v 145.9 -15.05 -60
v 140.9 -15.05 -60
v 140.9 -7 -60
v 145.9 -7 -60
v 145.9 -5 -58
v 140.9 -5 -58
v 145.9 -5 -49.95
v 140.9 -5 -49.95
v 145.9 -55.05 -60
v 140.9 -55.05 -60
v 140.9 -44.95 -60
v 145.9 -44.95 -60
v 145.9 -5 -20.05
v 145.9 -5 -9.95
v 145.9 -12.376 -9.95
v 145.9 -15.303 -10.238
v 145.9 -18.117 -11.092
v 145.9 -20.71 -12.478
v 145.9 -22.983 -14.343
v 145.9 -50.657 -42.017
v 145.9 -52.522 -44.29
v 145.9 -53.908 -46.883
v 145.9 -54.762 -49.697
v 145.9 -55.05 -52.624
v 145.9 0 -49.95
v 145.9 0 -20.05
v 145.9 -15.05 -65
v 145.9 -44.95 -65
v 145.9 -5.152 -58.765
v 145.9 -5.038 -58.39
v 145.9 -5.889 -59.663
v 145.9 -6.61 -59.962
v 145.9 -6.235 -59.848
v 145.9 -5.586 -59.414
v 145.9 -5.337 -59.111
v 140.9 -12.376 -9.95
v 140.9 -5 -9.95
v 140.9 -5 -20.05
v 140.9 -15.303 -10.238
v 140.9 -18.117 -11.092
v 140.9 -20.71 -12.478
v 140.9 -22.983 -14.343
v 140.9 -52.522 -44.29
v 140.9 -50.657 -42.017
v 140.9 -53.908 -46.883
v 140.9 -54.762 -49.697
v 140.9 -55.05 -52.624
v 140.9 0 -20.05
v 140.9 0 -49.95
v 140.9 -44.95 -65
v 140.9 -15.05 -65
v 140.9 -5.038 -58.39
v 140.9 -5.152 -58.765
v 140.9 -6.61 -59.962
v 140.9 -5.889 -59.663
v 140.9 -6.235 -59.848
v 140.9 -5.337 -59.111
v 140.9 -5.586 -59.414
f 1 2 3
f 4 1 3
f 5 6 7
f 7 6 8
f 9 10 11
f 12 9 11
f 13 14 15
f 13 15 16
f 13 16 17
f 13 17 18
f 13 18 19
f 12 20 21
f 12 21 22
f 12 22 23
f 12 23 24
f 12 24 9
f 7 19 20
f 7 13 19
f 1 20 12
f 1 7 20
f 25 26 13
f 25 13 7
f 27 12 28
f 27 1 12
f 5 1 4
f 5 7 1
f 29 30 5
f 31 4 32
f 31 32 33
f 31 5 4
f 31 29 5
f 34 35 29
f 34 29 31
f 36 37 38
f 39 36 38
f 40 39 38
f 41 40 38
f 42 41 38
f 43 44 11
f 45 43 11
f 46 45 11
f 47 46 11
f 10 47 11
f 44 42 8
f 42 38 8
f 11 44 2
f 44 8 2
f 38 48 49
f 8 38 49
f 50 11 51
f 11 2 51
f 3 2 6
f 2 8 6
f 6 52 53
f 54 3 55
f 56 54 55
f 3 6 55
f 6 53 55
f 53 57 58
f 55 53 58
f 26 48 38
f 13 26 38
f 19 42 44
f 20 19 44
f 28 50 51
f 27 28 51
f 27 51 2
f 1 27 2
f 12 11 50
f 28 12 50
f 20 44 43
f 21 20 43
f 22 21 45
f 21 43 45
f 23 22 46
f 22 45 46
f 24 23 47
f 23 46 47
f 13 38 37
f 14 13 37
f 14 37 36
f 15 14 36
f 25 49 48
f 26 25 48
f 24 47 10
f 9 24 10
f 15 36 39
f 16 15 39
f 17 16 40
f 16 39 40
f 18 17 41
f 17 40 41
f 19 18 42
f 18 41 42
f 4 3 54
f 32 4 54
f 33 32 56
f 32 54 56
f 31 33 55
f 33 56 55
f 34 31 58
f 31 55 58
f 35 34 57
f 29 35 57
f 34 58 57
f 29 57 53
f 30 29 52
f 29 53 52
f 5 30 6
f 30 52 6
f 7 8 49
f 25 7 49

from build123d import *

# Parameters (mm, degrees)
BODY_MOVE_COPY1_START         = -65
BODY_MOVE_COPY1_OUTLINE_W     = 5.1
BODY_MOVE_COPY1_OUTLINE_H     = 30.1
BODY_MOVE_COPY1_OUTLINE_R     = 2.6
BODY_MOVE_COPY1_OUTLINE_R_2   = 3.1
BODY_MOVE_COPY1_OUTLINE_R_3   = 1.55
BODY_MOVE_COPY1_OUTLINE_W_2   = 30.5
BODY_MOVE_COPY1_OUTLINE_H_2   = 14.5
BODY_MOVE_COPY1_DEPTH         = 5
BODY_MOVE_COPY1_START_2       = -5
BODY_MOVE_COPY1_2_OUTLINE_W   = 10
BODY_MOVE_COPY1_2_OUTLINE_H   = 5.2
BODY_MOVE_COPY1_2_OUTLINE_R   = 1.6
BODY_MOVE_COPY1_2_OUTLINE_W_2 = 5.1
BODY_MOVE_COPY1_2_OUTLINE_H_2 = 30.1
BODY_MOVE_COPY1_2_DEPTH       = 5
BOSS_EXTRUDE2_DEPTH           = 5


# Read off the part's stored shape, not the designer's step: Body-Move/Copy1
with BuildPart() as part:
    # Body-Move/Copy1 outline → Body-Move/Copy1 (new body)
    with BuildSketch(Plane.XY.offset(BODY_MOVE_COPY1_START)):
        Polygon((24.9, -310), (24.9, -305), (100.2, -305), (100.2, -310), (150, -310), (150, -5), (10.65, -5), (10.65, 0), (-10.65, 0), (-10.65, -5), (-150, -5), (-150, -310), (-100.2, -310), (-100.2, -305), (-24.9, -305), (-24.9, -310), align=None)
        with Locations((-143.45, -280)):
            Rectangle(BODY_MOVE_COPY1_OUTLINE_W, BODY_MOVE_COPY1_OUTLINE_H, mode=Mode.SUBTRACT)
        with Locations((-90, -157.5)):
            Circle(BODY_MOVE_COPY1_OUTLINE_R, mode=Mode.SUBTRACT)
        with Locations((-60, -157.5)):
            Circle(BODY_MOVE_COPY1_OUTLINE_R, mode=Mode.SUBTRACT)
        with Locations((143.45, -280)):
            Rectangle(BODY_MOVE_COPY1_OUTLINE_W, BODY_MOVE_COPY1_OUTLINE_H, mode=Mode.SUBTRACT)
        with Locations((65, -157.5)):
            Circle(BODY_MOVE_COPY1_OUTLINE_R_2, mode=Mode.SUBTRACT)
        with Locations((85, -157.5)):
            Circle(BODY_MOVE_COPY1_OUTLINE_R_2, mode=Mode.SUBTRACT)
        with Locations((-90, -137.5)):
            Circle(BODY_MOVE_COPY1_OUTLINE_R_3, mode=Mode.SUBTRACT)
        with Locations((-60, -137.5)):
            Circle(BODY_MOVE_COPY1_OUTLINE_R_3, mode=Mode.SUBTRACT)
        with Locations((-75, -100.25)):
            Rectangle(BODY_MOVE_COPY1_OUTLINE_W_2, BODY_MOVE_COPY1_OUTLINE_H_2, mode=Mode.SUBTRACT)
        with Locations((-143.45, -30)):
            Rectangle(BODY_MOVE_COPY1_OUTLINE_W, BODY_MOVE_COPY1_OUTLINE_H, mode=Mode.SUBTRACT)
        with Locations((143.45, -30)):
            Rectangle(BODY_MOVE_COPY1_OUTLINE_W, BODY_MOVE_COPY1_OUTLINE_H, mode=Mode.SUBTRACT)
    extrude(amount=BODY_MOVE_COPY1_DEPTH)


with BuildPart() as body_2:
    # Body-Move_Copy1 2 outline → Body-Move_Copy1 2 (new body)
    with BuildSketch(Plane(origin=(0, 0, 0), x_dir=(1, 0, 0), z_dir=(0, 1, 0)).offset(BODY_MOVE_COPY1_START_2)):
        with BuildLine():
            ThreePointArc((-95, -65), (-93.535533906, -61.464466094), (-90, -60))
            Line((-90, -60), (90, -60))
            ThreePointArc((90, -60), (93.535533906, -61.464466094), (95, -65))
            Line((95, -65), (95, -70))
            ThreePointArc((95, -70), (96.464466094, -73.535533906), (100, -75))
            Line((100, -75), (115, -75))
            ThreePointArc((115, -75), (118.535533906, -73.535533906), (120, -70))
            Line((120, -70), (120, -60))
            Line((120, -60), (145.606601718, -34.393398282))
            ThreePointArc((145.606601718, -34.393398282), (148.858192988, -29.52704805), (150, -23.786796564))
            Line((150, -23.786796564), (150, 65))
            Line((150, 65), (10.75, 65))
            Line((10.75, 65), (10.75, 60))
            Line((10.75, 60), (-10.75, 60))
            Line((-10.75, 60), (-10.75, 65))
            Line((-10.75, 65), (-150, 65))
            Line((-150, 65), (-150, -23.786796564))
            ThreePointArc((-150, -23.786796564), (-148.858192988, -29.52704805), (-145.606601718, -34.393398282))
            Line((-145.606601718, -34.393398282), (-120, -60))
            Line((-120, -60), (-120, -70))
            ThreePointArc((-120, -70), (-118.535533906, -73.535533906), (-115, -75))
            Line((-115, -75), (-100, -75))
            ThreePointArc((-100, -75), (-96.464466094, -73.535533906), (-95, -70))
            Line((-95, -70), (-95, -65))
        make_face()
        with Locations((-107.5, -67.5)):
            Rectangle(BODY_MOVE_COPY1_2_OUTLINE_W, BODY_MOVE_COPY1_2_OUTLINE_H, mode=Mode.SUBTRACT)
        with Locations((-110, -52.5)):
            Circle(BODY_MOVE_COPY1_2_OUTLINE_R, mode=Mode.SUBTRACT)
        with Locations((-5, -52.5)):
            Circle(BODY_MOVE_COPY1_2_OUTLINE_R, mode=Mode.SUBTRACT)
        with Locations((5, -52.5)):
            Circle(BODY_MOVE_COPY1_2_OUTLINE_R, mode=Mode.SUBTRACT)
        with Locations((107.5, -67.5)):
            Rectangle(BODY_MOVE_COPY1_2_OUTLINE_W, BODY_MOVE_COPY1_2_OUTLINE_H, mode=Mode.SUBTRACT)
        with Locations((110, -52.5)):
            Circle(BODY_MOVE_COPY1_2_OUTLINE_R, mode=Mode.SUBTRACT)
        with Locations((-143.45, 35)):
            Rectangle(BODY_MOVE_COPY1_2_OUTLINE_W_2, BODY_MOVE_COPY1_2_OUTLINE_H_2, mode=Mode.SUBTRACT)
        with Locations((-110, 52.5)):
            Circle(BODY_MOVE_COPY1_2_OUTLINE_R, mode=Mode.SUBTRACT)
        with Locations((-5, 52.5)):
            Circle(BODY_MOVE_COPY1_2_OUTLINE_R, mode=Mode.SUBTRACT)
        with BuildLine():
            Line((131.606601718, -30.178932188), (115.267766953, -46.517766953))
            ThreePointArc((115.267766953, -46.517766953), (114.456708581, -47.059698831), (113.5, -47.25))
            Line((113.5, -47.25), (107.75, -47.25))
            ThreePointArc((107.75, -47.25), (105.982233047, -47.982233047), (105.25, -49.75))
            Line((105.25, -49.75), (105.25, -53.5))
            ThreePointArc((105.25, -53.5), (104.517766953, -55.267766953), (102.75, -56))
            Line((102.75, -56), (13.25, -56))
            ThreePointArc((13.25, -56), (11.482233047, -55.267766953), (10.75, -53.5))
            Line((10.75, -53.5), (10.75, -49.75))
            ThreePointArc((10.75, -49.75), (10.017766953, -47.982233047), (8.25, -47.25))
            Line((8.25, -47.25), (-8.25, -47.25))
            ThreePointArc((-8.25, -47.25), (-10.017766953, -47.982233047), (-10.75, -49.75))
            Line((-10.75, -49.75), (-10.75, -53.5))
            ThreePointArc((-10.75, -53.5), (-11.482233047, -55.267766953), (-13.25, -56))
            Line((-13.25, -56), (-102.75, -56))
            ThreePointArc((-102.75, -56), (-104.517766953, -55.267766953), (-105.25, -53.5))
            Line((-105.25, -53.5), (-105.25, -49.75))
            ThreePointArc((-105.25, -49.75), (-105.982233047, -47.982233047), (-107.75, -47.25))
            Line((-107.75, -47.25), (-113.5, -47.25))
            ThreePointArc((-113.5, -47.25), (-115.267766953, -46.517766953), (-116, -44.75))
            Line((-116, -44.75), (-116, 44.75))
            ThreePointArc((-116, 44.75), (-115.267766953, 46.517766953), (-113.5, 47.25))
            Line((-113.5, 47.25), (-107.75, 47.25))
            ThreePointArc((-107.75, 47.25), (-105.982233047, 47.982233047), (-105.25, 49.75))
            Line((-105.25, 49.75), (-105.25, 53.5))
            ThreePointArc((-105.25, 53.5), (-104.517766953, 55.267766953), (-102.75, 56))
            Line((-102.75, 56), (-13.25, 56))
            ThreePointArc((-13.25, 56), (-11.482233047, 55.267766953), (-10.75, 53.5))
            Line((-10.75, 53.5), (-10.75, 49.75))
            ThreePointArc((-10.75, 49.75), (-10.017766953, 47.982233047), (-8.25, 47.25))
            Line((-8.25, 47.25), (8.25, 47.25))
            ThreePointArc((8.25, 47.25), (10.017766953, 47.982233047), (10.75, 49.75))
            Line((10.75, 49.75), (10.75, 53.5))
            ThreePointArc((10.75, 53.5), (11.482233047, 55.267766953), (13.25, 56))
            Line((13.25, 56), (102.75, 56))
            ThreePointArc((102.75, 56), (104.517766953, 55.267766953), (105.25, 53.5))
            Line((105.25, 53.5), (105.25, 49.75))
            ThreePointArc((105.25, 49.75), (105.982233047, 47.982233047), (107.75, 47.25))
            Line((107.75, 47.25), (113.5, 47.25))
            ThreePointArc((113.5, 47.25), (115.267766953, 47.982233047), (116, 49.75))
            Line((116, 49.75), (116, 53.5))
            ThreePointArc((116, 53.5), (116.732233047, 55.267766953), (118.5, 56))
            Line((118.5, 56), (133.5, 56))
            ThreePointArc((133.5, 56), (135.267766953, 55.267766953), (136, 53.5))
            Line((136, 53.5), (136, -19.57233047))
            ThreePointArc((136, -19.57233047), (134.858192988, -25.312581956), (131.606601718, -30.178932188))
        make_face(mode=Mode.SUBTRACT)
        with Locations((5, 52.5)):
            Circle(BODY_MOVE_COPY1_2_OUTLINE_R, mode=Mode.SUBTRACT)
        with Locations((143.45, 35)):
            Rectangle(BODY_MOVE_COPY1_2_OUTLINE_W_2, BODY_MOVE_COPY1_2_OUTLINE_H_2, mode=Mode.SUBTRACT)
        with Locations((110, 52.5)):
            Circle(BODY_MOVE_COPY1_2_OUTLINE_R, mode=Mode.SUBTRACT)
    extrude(amount=BODY_MOVE_COPY1_2_DEPTH)


with BuildPart() as body_3:
    # Sketch18 → Boss-Extrude2 (new body)
    with BuildSketch(Plane(origin=(140.9, 0, 0), x_dir=(0, 0, -1), z_dir=(1, 0, 0))):
        with BuildLine():
            Line((20.05, 0), (20.05, -5))
            Line((20.05, -5), (9.95, -5))
            Line((9.95, -5), (9.95, -12.376406871))
            ThreePointArc((9.95, -12.376406871), (11.091807012, -18.116658357), (14.343398282, -22.983008589))
            Line((14.343398282, -22.983008589), (42.016991411, -50.656601718))
            ThreePointArc((42.016991411, -50.656601718), (46.883341643, -53.908192988), (52.623593129, -55.05))
            Line((52.623593129, -55.05), (60, -55.05))
            Line((60, -55.05), (60, -44.95))
            Line((60, -44.95), (65, -44.95))
            Line((65, -44.95), (65, -15.05))
            Line((65, -15.05), (60, -15.05))
            Line((60, -15.05), (60, -7))
            ThreePointArc((60, -7), (59.414213562, -5.585786438), (58, -5))
            Line((58, -5), (49.95, -5))
            Line((49.95, -5), (49.95, 0))
            Line((49.95, 0), (20.05, 0))
        make_face()
    extrude(amount=BOSS_EXTRUDE2_DEPTH)


solid = body_3.part
